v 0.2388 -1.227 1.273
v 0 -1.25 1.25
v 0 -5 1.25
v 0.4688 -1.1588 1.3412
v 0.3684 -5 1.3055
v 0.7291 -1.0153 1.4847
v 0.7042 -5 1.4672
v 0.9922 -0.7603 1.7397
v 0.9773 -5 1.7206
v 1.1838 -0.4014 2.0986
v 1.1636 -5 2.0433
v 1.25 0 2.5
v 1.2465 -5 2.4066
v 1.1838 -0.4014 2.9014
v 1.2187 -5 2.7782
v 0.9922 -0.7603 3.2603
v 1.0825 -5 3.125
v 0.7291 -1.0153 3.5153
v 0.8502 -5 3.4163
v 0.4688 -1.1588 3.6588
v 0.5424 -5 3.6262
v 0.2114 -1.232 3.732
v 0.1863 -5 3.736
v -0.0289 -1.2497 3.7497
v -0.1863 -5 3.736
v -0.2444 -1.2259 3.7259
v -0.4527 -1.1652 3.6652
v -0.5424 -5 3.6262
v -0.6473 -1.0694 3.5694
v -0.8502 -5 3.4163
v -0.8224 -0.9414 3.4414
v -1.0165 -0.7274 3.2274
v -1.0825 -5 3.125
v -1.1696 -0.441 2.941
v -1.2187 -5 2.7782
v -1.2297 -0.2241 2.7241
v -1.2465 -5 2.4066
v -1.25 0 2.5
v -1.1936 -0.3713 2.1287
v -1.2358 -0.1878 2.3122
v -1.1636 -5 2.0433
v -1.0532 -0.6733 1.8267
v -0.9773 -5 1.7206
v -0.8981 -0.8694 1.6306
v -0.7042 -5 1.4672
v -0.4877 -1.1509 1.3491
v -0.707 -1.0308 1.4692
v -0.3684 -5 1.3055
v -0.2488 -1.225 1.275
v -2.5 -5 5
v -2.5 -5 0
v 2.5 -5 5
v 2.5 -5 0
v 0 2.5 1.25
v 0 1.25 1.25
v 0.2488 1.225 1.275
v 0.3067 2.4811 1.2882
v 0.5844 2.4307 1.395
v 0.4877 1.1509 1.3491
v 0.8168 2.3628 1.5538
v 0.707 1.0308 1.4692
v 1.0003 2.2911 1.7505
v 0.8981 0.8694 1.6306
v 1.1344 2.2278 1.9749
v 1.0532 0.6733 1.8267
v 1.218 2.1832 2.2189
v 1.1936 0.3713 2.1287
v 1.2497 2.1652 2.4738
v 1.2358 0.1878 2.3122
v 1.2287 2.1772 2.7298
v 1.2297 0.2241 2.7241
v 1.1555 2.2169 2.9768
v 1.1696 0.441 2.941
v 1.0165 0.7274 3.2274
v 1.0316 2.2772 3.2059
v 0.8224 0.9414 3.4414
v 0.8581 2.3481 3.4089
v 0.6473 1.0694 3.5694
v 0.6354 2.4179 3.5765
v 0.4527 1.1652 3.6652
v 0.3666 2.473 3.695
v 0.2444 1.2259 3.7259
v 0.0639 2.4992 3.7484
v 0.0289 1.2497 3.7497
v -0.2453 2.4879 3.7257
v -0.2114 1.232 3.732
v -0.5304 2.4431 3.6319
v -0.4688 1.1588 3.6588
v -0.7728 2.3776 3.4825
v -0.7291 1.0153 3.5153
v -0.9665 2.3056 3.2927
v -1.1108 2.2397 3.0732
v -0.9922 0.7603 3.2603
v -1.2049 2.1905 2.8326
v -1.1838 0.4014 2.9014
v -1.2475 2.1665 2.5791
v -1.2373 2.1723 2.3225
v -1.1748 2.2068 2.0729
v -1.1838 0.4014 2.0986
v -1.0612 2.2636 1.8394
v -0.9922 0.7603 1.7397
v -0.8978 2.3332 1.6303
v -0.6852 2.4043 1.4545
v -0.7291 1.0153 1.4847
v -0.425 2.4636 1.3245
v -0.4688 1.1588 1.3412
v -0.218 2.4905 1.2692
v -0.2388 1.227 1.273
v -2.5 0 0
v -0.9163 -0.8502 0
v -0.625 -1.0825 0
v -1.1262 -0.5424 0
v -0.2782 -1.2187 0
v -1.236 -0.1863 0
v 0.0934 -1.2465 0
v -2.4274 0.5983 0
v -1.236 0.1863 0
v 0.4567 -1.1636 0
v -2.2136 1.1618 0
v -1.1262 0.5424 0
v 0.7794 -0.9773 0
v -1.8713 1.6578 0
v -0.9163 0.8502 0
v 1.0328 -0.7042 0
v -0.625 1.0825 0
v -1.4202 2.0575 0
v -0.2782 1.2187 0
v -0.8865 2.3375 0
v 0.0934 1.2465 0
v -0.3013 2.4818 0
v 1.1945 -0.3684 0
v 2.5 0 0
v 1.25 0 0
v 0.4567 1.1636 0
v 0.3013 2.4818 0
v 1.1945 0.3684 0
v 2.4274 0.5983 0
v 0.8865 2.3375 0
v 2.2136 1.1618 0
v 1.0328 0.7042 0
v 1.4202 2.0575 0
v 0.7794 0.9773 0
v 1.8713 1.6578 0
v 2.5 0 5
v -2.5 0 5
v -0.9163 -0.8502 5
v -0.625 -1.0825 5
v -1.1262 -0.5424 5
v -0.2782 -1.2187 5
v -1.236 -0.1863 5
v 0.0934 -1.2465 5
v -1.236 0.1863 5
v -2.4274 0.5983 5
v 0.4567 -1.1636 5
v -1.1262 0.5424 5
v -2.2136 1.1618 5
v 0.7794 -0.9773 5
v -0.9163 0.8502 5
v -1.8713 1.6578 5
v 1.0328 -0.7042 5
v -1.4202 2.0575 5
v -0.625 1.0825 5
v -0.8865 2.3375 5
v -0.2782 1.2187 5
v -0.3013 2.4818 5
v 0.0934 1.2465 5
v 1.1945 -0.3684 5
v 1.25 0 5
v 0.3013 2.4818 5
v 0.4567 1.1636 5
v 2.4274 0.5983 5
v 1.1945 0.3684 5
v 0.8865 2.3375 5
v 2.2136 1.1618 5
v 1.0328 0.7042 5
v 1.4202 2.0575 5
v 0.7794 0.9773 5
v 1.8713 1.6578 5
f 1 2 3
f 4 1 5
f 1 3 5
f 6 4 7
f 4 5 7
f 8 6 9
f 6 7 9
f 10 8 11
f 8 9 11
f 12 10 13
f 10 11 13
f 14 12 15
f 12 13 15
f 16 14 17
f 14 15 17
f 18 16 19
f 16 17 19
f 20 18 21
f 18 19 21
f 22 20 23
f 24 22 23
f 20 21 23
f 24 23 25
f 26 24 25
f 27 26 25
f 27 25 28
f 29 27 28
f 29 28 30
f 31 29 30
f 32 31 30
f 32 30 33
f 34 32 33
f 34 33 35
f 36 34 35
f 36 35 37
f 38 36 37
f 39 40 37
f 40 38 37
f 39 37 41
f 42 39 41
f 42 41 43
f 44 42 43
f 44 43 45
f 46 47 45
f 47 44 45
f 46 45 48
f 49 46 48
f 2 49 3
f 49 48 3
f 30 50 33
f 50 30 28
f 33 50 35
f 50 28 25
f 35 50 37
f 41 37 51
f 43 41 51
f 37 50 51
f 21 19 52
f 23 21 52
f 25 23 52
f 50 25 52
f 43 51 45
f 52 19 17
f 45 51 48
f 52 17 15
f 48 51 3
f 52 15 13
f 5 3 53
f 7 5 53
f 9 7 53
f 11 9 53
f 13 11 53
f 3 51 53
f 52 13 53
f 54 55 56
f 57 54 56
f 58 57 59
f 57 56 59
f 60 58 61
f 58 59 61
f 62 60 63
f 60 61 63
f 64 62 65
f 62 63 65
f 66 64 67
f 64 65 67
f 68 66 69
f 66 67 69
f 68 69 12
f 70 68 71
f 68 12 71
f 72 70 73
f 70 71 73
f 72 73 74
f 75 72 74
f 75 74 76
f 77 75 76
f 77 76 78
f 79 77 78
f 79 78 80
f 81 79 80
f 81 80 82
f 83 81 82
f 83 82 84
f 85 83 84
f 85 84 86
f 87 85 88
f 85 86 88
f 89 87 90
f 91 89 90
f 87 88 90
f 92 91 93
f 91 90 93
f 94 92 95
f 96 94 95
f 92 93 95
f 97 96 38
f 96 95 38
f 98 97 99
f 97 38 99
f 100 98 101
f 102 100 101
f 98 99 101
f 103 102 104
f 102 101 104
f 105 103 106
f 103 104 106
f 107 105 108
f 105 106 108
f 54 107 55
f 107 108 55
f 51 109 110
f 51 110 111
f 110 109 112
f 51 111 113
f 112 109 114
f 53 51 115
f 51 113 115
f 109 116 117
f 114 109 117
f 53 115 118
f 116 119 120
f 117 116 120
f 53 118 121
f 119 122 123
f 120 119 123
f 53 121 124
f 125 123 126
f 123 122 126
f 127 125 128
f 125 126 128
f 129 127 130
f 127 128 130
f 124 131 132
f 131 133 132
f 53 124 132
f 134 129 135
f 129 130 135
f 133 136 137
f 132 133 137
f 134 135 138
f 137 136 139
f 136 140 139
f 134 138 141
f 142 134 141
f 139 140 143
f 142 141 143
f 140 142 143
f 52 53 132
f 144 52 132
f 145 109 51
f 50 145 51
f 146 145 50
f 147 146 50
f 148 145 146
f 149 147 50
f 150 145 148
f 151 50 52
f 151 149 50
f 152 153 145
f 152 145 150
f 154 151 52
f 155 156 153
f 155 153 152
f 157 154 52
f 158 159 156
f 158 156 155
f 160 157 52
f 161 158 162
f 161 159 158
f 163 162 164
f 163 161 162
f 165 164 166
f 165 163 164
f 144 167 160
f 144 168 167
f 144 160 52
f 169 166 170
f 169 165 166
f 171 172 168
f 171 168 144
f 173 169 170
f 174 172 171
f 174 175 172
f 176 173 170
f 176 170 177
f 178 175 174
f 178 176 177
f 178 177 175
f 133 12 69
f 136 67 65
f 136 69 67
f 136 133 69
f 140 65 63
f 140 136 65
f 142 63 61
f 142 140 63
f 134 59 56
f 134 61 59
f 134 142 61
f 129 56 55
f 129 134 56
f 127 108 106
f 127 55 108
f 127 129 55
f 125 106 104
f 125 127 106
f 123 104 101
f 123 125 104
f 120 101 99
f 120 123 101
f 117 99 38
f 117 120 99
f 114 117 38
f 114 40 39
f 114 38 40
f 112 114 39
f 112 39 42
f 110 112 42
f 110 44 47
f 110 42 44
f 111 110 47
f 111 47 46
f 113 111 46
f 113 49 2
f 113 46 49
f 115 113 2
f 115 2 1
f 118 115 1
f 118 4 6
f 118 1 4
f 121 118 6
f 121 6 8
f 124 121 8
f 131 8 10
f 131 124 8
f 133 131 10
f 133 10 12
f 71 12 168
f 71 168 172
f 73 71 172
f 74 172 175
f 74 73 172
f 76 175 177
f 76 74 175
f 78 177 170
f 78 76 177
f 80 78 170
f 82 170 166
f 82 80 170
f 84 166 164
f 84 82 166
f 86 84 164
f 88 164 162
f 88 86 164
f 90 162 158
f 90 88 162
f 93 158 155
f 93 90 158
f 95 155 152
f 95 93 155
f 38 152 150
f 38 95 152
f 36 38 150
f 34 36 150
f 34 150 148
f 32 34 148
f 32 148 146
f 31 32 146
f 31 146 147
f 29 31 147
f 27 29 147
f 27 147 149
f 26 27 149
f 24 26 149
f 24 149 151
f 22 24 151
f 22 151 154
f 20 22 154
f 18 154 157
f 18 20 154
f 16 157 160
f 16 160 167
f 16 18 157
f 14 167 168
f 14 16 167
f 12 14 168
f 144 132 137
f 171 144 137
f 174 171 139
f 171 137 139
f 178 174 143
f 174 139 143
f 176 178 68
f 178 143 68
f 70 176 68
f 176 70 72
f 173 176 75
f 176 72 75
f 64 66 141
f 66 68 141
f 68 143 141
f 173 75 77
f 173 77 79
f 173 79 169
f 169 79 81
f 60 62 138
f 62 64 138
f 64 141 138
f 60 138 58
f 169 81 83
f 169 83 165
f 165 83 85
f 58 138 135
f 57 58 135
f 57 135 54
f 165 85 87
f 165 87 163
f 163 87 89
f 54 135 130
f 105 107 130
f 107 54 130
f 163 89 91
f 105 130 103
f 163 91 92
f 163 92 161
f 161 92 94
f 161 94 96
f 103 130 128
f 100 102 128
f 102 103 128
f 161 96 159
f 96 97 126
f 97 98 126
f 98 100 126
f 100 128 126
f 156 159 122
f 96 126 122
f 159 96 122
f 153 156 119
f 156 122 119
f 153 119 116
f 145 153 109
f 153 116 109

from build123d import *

# Parameters (mm, degrees)
SKETCH1_R           = 2.5
SKETCH1_R_2         = 1.25
BOSS_EXTRUDE1_DEPTH = 5
SKETCH2_R           = 1.25
CUT_EXTRUDE1_DEPTH  = 10.354143467


with BuildPart() as part:
    # Sketch1 → Boss-Extrude1 (new body)
    # profile 1 of 2: a face of its own
    with BuildSketch(Plane.XY):
        with BuildLine():
            ThreePointArc((2.5, 0), (0, -2.5), (-2.5, 0))
            Line((-2.5, 0), (-2.5, -5))
            Line((-2.5, -5), (2.5, -5))
            Line((2.5, -5), (2.5, 0))
        make_face()
    # profile 2 of 2: a face of its own
    with BuildSketch(Plane.XY):
        Circle(SKETCH1_R)
        Circle(SKETCH1_R_2, mode=Mode.SUBTRACT)
    extrude(amount=BOSS_EXTRUDE1_DEPTH)

    # Sketch2 → Cut-Extrude1 (cut, through all)
    with BuildSketch(Plane.XZ.offset(5)):
        with Locations(Location((0, 2.5, 0), (0, 0, 270))):
            Circle(SKETCH2_R)
    extrude(amount=-CUT_EXTRUDE1_DEPTH, mode=Mode.SUBTRACT)


solid = part.part
